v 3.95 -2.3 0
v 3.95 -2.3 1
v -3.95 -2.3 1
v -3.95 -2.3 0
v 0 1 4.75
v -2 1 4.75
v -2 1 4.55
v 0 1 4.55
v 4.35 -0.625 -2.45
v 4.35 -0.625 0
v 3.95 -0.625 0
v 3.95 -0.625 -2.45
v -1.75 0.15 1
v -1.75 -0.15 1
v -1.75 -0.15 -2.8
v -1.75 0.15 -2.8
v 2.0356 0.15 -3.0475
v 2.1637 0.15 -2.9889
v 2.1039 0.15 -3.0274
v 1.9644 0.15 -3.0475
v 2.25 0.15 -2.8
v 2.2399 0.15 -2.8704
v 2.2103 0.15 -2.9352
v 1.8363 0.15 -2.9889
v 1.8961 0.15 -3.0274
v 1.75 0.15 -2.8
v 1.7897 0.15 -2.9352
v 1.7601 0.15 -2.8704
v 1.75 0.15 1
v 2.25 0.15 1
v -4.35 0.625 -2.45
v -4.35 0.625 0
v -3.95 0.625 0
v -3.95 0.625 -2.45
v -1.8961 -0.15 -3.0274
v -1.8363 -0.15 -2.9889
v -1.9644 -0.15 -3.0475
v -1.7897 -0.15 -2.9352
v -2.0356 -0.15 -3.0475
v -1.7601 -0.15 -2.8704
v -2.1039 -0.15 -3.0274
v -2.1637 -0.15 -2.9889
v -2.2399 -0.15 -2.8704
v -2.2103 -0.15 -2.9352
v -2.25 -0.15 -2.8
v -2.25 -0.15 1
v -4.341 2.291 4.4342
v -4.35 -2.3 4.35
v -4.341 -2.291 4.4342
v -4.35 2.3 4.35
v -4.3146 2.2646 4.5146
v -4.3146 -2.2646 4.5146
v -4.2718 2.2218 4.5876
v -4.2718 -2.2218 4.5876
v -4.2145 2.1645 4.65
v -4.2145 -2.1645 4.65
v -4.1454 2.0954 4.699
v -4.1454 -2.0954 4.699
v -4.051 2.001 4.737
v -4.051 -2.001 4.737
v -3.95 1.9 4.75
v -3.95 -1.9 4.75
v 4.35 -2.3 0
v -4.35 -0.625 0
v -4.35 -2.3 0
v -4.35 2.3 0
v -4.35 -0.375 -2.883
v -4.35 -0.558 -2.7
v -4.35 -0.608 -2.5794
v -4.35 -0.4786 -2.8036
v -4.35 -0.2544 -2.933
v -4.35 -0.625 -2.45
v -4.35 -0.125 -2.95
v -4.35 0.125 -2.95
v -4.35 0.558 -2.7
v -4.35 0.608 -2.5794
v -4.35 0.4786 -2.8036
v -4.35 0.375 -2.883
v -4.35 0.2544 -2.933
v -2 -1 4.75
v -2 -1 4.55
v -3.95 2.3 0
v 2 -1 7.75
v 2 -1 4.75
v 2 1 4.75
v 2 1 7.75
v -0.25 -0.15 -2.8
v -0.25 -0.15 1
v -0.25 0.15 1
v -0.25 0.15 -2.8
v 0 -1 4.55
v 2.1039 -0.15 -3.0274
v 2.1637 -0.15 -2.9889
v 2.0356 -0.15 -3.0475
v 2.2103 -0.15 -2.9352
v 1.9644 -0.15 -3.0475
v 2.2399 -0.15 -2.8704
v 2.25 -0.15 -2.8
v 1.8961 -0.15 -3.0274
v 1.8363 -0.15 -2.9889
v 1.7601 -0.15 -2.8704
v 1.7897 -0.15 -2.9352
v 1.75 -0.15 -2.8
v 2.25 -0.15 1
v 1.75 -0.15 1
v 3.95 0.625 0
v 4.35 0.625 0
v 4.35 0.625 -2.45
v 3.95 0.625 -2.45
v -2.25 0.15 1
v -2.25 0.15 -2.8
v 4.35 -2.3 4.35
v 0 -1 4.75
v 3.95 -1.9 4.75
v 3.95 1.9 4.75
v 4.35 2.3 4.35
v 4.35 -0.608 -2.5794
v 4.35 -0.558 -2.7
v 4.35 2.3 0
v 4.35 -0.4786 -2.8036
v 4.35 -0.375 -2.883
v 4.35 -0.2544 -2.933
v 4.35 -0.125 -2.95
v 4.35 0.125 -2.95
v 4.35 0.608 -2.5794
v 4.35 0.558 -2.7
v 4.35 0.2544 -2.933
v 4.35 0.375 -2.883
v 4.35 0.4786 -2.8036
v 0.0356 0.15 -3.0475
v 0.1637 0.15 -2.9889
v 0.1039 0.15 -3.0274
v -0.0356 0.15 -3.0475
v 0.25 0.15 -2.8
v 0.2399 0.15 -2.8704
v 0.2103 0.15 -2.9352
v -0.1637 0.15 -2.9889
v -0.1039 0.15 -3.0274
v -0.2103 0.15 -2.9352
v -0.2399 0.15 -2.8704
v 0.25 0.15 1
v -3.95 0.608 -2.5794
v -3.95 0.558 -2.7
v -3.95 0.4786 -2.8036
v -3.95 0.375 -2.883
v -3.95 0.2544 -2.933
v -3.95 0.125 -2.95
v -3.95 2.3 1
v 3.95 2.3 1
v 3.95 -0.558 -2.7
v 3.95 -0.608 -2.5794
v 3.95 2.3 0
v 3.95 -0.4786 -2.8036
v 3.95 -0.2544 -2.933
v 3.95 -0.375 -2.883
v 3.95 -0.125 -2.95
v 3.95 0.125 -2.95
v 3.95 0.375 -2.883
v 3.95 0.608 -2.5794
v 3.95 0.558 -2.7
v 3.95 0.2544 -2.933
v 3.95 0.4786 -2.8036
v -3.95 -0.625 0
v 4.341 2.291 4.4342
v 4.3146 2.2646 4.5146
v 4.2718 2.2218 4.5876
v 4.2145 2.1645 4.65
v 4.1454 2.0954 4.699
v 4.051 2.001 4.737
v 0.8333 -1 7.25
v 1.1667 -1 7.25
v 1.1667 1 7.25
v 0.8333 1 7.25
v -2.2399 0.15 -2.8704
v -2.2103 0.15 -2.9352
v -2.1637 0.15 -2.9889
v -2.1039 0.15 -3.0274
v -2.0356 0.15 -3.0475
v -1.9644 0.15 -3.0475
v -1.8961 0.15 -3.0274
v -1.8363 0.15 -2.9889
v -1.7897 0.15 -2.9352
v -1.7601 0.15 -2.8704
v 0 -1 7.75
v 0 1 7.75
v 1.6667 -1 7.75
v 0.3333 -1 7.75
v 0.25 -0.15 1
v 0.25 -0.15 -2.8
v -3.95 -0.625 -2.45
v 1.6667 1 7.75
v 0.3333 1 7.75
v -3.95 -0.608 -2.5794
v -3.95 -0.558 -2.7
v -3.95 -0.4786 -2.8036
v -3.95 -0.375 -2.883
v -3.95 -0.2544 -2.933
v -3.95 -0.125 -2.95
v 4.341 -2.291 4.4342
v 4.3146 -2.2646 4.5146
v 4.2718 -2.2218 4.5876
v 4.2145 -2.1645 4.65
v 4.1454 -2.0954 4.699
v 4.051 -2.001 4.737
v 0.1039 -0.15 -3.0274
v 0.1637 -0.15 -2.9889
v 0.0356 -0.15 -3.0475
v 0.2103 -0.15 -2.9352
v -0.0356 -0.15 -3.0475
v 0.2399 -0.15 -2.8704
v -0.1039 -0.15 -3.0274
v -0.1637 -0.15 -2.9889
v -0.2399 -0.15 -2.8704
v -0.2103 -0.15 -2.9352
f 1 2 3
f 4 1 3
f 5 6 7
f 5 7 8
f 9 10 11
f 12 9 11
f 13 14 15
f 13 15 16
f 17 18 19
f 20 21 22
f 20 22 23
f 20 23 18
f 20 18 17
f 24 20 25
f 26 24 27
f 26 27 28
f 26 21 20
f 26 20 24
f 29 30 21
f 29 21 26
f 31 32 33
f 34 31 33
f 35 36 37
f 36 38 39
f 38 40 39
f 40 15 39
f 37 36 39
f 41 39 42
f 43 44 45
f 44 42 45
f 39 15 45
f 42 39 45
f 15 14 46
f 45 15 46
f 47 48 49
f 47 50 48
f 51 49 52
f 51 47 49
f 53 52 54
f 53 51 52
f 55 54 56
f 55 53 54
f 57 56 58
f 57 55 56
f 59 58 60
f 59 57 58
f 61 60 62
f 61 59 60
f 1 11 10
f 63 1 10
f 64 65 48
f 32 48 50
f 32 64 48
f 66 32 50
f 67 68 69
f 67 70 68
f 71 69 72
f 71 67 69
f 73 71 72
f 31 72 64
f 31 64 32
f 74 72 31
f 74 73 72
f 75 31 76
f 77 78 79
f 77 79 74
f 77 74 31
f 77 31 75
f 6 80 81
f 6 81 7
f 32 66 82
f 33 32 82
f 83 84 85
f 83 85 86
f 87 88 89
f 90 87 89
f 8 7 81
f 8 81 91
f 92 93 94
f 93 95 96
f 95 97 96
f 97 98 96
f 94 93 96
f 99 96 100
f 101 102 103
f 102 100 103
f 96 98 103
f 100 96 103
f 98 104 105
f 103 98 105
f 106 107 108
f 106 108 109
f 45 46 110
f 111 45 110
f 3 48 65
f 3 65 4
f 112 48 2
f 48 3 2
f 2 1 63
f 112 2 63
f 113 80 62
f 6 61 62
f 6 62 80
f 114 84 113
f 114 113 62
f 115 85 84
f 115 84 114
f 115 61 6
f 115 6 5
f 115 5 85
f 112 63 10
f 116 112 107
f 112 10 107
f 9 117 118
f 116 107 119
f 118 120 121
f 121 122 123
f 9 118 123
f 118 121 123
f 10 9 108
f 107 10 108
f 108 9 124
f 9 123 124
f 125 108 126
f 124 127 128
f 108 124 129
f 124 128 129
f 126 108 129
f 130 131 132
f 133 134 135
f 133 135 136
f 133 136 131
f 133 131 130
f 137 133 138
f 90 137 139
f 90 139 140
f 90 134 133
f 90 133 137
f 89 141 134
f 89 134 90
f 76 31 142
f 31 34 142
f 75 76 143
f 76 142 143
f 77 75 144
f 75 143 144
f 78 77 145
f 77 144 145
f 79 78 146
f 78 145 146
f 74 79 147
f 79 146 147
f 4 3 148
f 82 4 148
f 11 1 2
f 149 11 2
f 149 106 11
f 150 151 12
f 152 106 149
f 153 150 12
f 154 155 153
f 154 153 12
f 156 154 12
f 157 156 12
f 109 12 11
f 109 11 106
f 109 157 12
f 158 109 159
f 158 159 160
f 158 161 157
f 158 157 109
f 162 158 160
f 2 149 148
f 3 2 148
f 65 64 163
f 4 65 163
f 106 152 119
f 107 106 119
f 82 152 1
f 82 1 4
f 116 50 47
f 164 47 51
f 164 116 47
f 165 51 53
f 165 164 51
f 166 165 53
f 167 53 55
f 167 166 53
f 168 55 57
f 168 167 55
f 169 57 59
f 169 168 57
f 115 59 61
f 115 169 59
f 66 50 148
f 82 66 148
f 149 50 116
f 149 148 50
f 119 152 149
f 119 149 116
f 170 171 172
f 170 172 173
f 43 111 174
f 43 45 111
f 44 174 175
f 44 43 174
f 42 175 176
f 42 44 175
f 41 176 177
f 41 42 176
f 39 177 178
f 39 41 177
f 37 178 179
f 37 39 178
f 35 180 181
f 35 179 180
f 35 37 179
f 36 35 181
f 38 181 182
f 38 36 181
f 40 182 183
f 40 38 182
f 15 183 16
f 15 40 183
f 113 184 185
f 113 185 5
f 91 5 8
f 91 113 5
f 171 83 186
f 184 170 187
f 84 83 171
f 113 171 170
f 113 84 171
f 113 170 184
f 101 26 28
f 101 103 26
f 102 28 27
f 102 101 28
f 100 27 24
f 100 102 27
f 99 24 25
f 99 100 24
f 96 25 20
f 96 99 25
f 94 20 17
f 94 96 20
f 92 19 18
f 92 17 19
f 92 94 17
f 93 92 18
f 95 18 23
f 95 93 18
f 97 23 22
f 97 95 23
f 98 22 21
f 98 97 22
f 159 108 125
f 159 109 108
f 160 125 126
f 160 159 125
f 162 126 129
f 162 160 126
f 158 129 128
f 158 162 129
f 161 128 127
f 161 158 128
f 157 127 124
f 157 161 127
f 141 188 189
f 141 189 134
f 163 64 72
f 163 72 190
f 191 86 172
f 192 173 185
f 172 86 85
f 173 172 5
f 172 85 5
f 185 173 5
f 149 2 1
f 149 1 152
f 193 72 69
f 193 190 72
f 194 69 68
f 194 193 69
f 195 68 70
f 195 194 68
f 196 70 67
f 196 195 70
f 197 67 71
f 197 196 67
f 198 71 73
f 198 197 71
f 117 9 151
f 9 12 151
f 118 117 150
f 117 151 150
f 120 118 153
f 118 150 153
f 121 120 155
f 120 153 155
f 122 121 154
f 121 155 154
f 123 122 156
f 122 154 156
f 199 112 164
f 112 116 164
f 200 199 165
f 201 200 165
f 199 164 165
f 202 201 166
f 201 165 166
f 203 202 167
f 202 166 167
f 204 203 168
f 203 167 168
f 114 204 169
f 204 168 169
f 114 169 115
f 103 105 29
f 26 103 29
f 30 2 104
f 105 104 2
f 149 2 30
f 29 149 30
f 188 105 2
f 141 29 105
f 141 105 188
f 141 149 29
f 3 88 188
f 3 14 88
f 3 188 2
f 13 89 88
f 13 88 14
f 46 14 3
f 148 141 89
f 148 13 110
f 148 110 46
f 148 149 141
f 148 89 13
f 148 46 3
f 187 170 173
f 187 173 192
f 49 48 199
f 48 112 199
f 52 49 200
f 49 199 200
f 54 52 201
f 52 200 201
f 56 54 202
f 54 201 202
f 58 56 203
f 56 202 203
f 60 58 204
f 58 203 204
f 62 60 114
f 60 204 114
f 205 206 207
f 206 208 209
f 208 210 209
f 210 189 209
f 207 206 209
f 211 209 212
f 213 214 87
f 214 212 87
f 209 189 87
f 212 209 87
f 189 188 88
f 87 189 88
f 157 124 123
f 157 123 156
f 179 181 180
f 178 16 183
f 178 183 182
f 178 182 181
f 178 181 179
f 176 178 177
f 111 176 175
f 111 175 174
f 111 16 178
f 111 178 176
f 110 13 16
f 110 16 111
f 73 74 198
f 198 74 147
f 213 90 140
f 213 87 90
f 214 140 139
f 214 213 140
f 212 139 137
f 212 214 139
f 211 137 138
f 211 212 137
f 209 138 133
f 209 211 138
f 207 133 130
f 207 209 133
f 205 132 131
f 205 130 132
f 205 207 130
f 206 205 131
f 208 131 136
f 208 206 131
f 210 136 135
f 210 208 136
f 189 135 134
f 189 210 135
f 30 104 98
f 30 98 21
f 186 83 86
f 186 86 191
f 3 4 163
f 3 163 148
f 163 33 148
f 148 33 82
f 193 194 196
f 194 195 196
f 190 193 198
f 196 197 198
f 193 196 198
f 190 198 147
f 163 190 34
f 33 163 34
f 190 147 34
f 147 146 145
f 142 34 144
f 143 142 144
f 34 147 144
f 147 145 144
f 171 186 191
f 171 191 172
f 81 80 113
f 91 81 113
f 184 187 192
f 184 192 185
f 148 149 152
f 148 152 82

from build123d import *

# Parameters (mm, degrees)
SKETCH1_W                         = 8.7
SKETCH1_H                         = 4.6
BOSS_EXTRUDE1_DEPTH               = 4.75
FILLET2_R                         = 0.4
SKETCH2_W                         = 4
SKETCH2_H                         = 2
CUT_EXTRUDE1_DEPTH                = 0.2
BOSS_EXTRUDE2_DEPTH               = 2
SKETCH8_W                         = 7.9
SKETCH8_H                         = 4.6
CUT_EXTRUDE2_DEPTH                = 1
SKETCH5_W                         = 0.4
SKETCH5_H                         = 1.25
BOSS_EXTRUDE3_DEPTH               = 2.95
FILLET3_R                         = 0.5
FILLET3_OF_MIRROR1_R              = 0.5
SKETCH10_W                        = 0.5
SKETCH10_H                        = 0.3
BOSS_EXTRUDE6_DEPTH               = 4.05
FILLET5_RADIUS                    = 0.25
FILLET5_LENGTH                    = 0.3
LPATTERN3_COUNT                   = 2
LPATTERN3_PITCH                   = 2
FILLET5_OF_LPATTERN3_2_RADIUS     = 0.25
FILLET5_OF_LPATTERN3_2_LENGTH     = 0.3
LPATTERN3_COL_COUNT               = 2
LPATTERN3_COL_PITCH               = 2
FILLET5_OF_LPATTERN3_COL_2_RADIUS = 0.25
FILLET5_OF_LPATTERN3_COL_2_LENGTH = 0.3
SKETCH9_W                         = 7.9
SKETCH9_H                         = 4.6
BOSS_EXTRUDE7_DEPTH               = 1


with BuildPart() as part:
    # Sketch1 → Boss-Extrude1 (new body)
    with BuildSketch(Plane.XY):
        Rectangle(SKETCH1_W, SKETCH1_H)
    extrude(amount=BOSS_EXTRUDE1_DEPTH)

    # Fillet2
    fillet2_edges = [part.edges().sort_by_distance(p)[0] for p in [
        (-4.35, 0, 4.75),
        (0, -2.3, 4.75),
        (4.35, 0, 4.75),
        (0, 2.3, 4.75),
    ]]
    fillet(fillet2_edges, radius=FILLET2_R)

    # Sketch2 → Cut-Extrude1 (cut)
    with BuildSketch(Plane.XY.offset(4.75)):
        Rectangle(SKETCH2_W, SKETCH2_H)
    extrude(amount=-CUT_EXTRUDE1_DEPTH, mode=Mode.SUBTRACT)

    # Sketch4 → Boss-Extrude2 (add)
    with BuildSketch(Plane(origin=(0, -1, 0), x_dir=(1, 0, 0), z_dir=(0, 1, 0))):
        Polygon((2, -4.55), (2, -7.75), (1.666666667, -7.75), (1.166666667, -7.25), (0.833333333, -7.25), (0.333333333, -7.75), (0, -7.75), (0, -4.55), align=None)
    extrude(amount=BOSS_EXTRUDE2_DEPTH)

    # Sketch8 → Cut-Extrude2 (cut)
    with BuildSketch(Plane(origin=(0, 0, 0), x_dir=(-1, 0, 0), z_dir=(0, 0, -1))):
        Rectangle(SKETCH8_W, SKETCH8_H)
    extrude(amount=-CUT_EXTRUDE2_DEPTH, mode=Mode.SUBTRACT)

    # Sketch5 → Boss-Extrude3 (add)
    with BuildSketch(Plane(origin=(0, 0, 0), x_dir=(-1, 0, 0), z_dir=(0, 0, -1))):
        with Locations((-4.15, 0)):
            Rectangle(SKETCH5_W, SKETCH5_H)
    boss_extrude3 = extrude(amount=BOSS_EXTRUDE3_DEPTH)

    # Fillet3
    fillet3_edges = [part.edges().sort_by_distance(p)[0] for p in [
        (4.15, 0.625, -2.95),
        (4.15, -0.625, -2.95),
    ]]
    fillet(fillet3_edges, radius=FILLET3_R)

    # Mirror1: Boss-Extrude3 across plane
    add(boss_extrude3.mirror(Plane(origin=(0, 0, 0), x_dir=(0, 0, 1), z_dir=(1, 0, 0))))

    # Fillet3 of Mirror1
    fillet3_of_mirror1_edges = [part.edges().sort_by_distance(p)[0] for p in [
        (-4.15, 0.625, -2.95),
        (-4.15, -0.625, -2.95),
    ]]
    fillet(fillet3_of_mirror1_edges, radius=FILLET3_OF_MIRROR1_R)

    # Sketch10 → Boss-Extrude6 (add)
    with BuildSketch(Plane(origin=(0, 0, 1), x_dir=(-1, 0, 0), z_dir=(0, 0, -1))):
        Rectangle(SKETCH10_W, SKETCH10_H)
    boss_extrude6 = extrude(amount=BOSS_EXTRUDE6_DEPTH)

    # Fillet5: full round fillet: the end face becomes a half cylinder, R = half its width
    fillet5_face = Plane((0, 0, -3.05), x_dir=(0, -1, 0), z_dir=(0, 0, -1))  # on the end face: x along it, z out of the body
    fillet5_slab = fillet5_face.offset(-FILLET5_RADIUS / 2) * Box(FILLET5_LENGTH, 2 * FILLET5_RADIUS, FILLET5_RADIUS, mode=Mode.PRIVATE)  # the body's end, R deep
    fillet5_round = Plane((0, 0, -2.8), x_dir=(0, 0, -1), z_dir=(0, -1, 0)) * Cylinder(FILLET5_RADIUS, FILLET5_LENGTH, mode=Mode.PRIVATE)  # its axis R under the face
    add(fillet5_slab - fillet5_round, mode=Mode.SUBTRACT)

    # LPattern3: Boss-Extrude6 ×2
    with Locations(*[(i * LPATTERN3_PITCH, 0, 0) for i in range(1, LPATTERN3_COUNT)]):
        add(boss_extrude6)

    # Fillet5 of LPattern3 2: full round fillet: the end face becomes a half cylinder, R = half its width
    fillet5_of_lpattern3_2_face = Plane((2, 0, -3.05), x_dir=(0, -1, 0), z_dir=(0, 0, -1))  # on the end face: x along it, z out of the body
    fillet5_of_lpattern3_2_slab = fillet5_of_lpattern3_2_face.offset(-FILLET5_OF_LPATTERN3_2_RADIUS / 2) * Box(FILLET5_OF_LPATTERN3_2_LENGTH, 2 * FILLET5_OF_LPATTERN3_2_RADIUS, FILLET5_OF_LPATTERN3_2_RADIUS, mode=Mode.PRIVATE)  # the body's end, R deep
    fillet5_of_lpattern3_2_round = Plane((2, 0, -2.8), x_dir=(0, 0, -1), z_dir=(0, -1, 0)) * Cylinder(FILLET5_OF_LPATTERN3_2_RADIUS, FILLET5_OF_LPATTERN3_2_LENGTH, mode=Mode.PRIVATE)  # its axis R under the face
    add(fillet5_of_lpattern3_2_slab - fillet5_of_lpattern3_2_round, mode=Mode.SUBTRACT)

    # LPattern3 col: Boss-Extrude6 ×2
    with Locations(*[(-i * LPATTERN3_COL_PITCH, 0, 0) for i in range(1, LPATTERN3_COL_COUNT)]):
        add(boss_extrude6)

    # Fillet5 of LPattern3 col 2: full round fillet: the end face becomes a half cylinder, R = half its width
    fillet5_of_lpattern3_col_2_face = Plane((-2, 0, -3.05), x_dir=(0, -1, 0), z_dir=(0, 0, -1))  # on the end face: x along it, z out of the body
    fillet5_of_lpattern3_col_2_slab = fillet5_of_lpattern3_col_2_face.offset(-FILLET5_OF_LPATTERN3_COL_2_RADIUS / 2) * Box(FILLET5_OF_LPATTERN3_COL_2_LENGTH, 2 * FILLET5_OF_LPATTERN3_COL_2_RADIUS, FILLET5_OF_LPATTERN3_COL_2_RADIUS, mode=Mode.PRIVATE)  # the body's end, R deep
    fillet5_of_lpattern3_col_2_round = Plane((-2, 0, -2.8), x_dir=(0, 0, -1), z_dir=(0, -1, 0)) * Cylinder(FILLET5_OF_LPATTERN3_COL_2_RADIUS, FILLET5_OF_LPATTERN3_COL_2_LENGTH, mode=Mode.PRIVATE)  # its axis R under the face
    add(fillet5_of_lpattern3_col_2_slab - fillet5_of_lpattern3_col_2_round, mode=Mode.SUBTRACT)


with BuildPart() as body_2:
    # Sketch9 → Boss-Extrude7 (new body)
    with BuildSketch(Plane(origin=(0, 0, 1), x_dir=(-1, 0, 0), z_dir=(0, 0, -1))):
        Rectangle(SKETCH9_W, SKETCH9_H)
    extrude(amount=BOSS_EXTRUDE7_DEPTH)


solid = Compound([part.part, body_2.part])
